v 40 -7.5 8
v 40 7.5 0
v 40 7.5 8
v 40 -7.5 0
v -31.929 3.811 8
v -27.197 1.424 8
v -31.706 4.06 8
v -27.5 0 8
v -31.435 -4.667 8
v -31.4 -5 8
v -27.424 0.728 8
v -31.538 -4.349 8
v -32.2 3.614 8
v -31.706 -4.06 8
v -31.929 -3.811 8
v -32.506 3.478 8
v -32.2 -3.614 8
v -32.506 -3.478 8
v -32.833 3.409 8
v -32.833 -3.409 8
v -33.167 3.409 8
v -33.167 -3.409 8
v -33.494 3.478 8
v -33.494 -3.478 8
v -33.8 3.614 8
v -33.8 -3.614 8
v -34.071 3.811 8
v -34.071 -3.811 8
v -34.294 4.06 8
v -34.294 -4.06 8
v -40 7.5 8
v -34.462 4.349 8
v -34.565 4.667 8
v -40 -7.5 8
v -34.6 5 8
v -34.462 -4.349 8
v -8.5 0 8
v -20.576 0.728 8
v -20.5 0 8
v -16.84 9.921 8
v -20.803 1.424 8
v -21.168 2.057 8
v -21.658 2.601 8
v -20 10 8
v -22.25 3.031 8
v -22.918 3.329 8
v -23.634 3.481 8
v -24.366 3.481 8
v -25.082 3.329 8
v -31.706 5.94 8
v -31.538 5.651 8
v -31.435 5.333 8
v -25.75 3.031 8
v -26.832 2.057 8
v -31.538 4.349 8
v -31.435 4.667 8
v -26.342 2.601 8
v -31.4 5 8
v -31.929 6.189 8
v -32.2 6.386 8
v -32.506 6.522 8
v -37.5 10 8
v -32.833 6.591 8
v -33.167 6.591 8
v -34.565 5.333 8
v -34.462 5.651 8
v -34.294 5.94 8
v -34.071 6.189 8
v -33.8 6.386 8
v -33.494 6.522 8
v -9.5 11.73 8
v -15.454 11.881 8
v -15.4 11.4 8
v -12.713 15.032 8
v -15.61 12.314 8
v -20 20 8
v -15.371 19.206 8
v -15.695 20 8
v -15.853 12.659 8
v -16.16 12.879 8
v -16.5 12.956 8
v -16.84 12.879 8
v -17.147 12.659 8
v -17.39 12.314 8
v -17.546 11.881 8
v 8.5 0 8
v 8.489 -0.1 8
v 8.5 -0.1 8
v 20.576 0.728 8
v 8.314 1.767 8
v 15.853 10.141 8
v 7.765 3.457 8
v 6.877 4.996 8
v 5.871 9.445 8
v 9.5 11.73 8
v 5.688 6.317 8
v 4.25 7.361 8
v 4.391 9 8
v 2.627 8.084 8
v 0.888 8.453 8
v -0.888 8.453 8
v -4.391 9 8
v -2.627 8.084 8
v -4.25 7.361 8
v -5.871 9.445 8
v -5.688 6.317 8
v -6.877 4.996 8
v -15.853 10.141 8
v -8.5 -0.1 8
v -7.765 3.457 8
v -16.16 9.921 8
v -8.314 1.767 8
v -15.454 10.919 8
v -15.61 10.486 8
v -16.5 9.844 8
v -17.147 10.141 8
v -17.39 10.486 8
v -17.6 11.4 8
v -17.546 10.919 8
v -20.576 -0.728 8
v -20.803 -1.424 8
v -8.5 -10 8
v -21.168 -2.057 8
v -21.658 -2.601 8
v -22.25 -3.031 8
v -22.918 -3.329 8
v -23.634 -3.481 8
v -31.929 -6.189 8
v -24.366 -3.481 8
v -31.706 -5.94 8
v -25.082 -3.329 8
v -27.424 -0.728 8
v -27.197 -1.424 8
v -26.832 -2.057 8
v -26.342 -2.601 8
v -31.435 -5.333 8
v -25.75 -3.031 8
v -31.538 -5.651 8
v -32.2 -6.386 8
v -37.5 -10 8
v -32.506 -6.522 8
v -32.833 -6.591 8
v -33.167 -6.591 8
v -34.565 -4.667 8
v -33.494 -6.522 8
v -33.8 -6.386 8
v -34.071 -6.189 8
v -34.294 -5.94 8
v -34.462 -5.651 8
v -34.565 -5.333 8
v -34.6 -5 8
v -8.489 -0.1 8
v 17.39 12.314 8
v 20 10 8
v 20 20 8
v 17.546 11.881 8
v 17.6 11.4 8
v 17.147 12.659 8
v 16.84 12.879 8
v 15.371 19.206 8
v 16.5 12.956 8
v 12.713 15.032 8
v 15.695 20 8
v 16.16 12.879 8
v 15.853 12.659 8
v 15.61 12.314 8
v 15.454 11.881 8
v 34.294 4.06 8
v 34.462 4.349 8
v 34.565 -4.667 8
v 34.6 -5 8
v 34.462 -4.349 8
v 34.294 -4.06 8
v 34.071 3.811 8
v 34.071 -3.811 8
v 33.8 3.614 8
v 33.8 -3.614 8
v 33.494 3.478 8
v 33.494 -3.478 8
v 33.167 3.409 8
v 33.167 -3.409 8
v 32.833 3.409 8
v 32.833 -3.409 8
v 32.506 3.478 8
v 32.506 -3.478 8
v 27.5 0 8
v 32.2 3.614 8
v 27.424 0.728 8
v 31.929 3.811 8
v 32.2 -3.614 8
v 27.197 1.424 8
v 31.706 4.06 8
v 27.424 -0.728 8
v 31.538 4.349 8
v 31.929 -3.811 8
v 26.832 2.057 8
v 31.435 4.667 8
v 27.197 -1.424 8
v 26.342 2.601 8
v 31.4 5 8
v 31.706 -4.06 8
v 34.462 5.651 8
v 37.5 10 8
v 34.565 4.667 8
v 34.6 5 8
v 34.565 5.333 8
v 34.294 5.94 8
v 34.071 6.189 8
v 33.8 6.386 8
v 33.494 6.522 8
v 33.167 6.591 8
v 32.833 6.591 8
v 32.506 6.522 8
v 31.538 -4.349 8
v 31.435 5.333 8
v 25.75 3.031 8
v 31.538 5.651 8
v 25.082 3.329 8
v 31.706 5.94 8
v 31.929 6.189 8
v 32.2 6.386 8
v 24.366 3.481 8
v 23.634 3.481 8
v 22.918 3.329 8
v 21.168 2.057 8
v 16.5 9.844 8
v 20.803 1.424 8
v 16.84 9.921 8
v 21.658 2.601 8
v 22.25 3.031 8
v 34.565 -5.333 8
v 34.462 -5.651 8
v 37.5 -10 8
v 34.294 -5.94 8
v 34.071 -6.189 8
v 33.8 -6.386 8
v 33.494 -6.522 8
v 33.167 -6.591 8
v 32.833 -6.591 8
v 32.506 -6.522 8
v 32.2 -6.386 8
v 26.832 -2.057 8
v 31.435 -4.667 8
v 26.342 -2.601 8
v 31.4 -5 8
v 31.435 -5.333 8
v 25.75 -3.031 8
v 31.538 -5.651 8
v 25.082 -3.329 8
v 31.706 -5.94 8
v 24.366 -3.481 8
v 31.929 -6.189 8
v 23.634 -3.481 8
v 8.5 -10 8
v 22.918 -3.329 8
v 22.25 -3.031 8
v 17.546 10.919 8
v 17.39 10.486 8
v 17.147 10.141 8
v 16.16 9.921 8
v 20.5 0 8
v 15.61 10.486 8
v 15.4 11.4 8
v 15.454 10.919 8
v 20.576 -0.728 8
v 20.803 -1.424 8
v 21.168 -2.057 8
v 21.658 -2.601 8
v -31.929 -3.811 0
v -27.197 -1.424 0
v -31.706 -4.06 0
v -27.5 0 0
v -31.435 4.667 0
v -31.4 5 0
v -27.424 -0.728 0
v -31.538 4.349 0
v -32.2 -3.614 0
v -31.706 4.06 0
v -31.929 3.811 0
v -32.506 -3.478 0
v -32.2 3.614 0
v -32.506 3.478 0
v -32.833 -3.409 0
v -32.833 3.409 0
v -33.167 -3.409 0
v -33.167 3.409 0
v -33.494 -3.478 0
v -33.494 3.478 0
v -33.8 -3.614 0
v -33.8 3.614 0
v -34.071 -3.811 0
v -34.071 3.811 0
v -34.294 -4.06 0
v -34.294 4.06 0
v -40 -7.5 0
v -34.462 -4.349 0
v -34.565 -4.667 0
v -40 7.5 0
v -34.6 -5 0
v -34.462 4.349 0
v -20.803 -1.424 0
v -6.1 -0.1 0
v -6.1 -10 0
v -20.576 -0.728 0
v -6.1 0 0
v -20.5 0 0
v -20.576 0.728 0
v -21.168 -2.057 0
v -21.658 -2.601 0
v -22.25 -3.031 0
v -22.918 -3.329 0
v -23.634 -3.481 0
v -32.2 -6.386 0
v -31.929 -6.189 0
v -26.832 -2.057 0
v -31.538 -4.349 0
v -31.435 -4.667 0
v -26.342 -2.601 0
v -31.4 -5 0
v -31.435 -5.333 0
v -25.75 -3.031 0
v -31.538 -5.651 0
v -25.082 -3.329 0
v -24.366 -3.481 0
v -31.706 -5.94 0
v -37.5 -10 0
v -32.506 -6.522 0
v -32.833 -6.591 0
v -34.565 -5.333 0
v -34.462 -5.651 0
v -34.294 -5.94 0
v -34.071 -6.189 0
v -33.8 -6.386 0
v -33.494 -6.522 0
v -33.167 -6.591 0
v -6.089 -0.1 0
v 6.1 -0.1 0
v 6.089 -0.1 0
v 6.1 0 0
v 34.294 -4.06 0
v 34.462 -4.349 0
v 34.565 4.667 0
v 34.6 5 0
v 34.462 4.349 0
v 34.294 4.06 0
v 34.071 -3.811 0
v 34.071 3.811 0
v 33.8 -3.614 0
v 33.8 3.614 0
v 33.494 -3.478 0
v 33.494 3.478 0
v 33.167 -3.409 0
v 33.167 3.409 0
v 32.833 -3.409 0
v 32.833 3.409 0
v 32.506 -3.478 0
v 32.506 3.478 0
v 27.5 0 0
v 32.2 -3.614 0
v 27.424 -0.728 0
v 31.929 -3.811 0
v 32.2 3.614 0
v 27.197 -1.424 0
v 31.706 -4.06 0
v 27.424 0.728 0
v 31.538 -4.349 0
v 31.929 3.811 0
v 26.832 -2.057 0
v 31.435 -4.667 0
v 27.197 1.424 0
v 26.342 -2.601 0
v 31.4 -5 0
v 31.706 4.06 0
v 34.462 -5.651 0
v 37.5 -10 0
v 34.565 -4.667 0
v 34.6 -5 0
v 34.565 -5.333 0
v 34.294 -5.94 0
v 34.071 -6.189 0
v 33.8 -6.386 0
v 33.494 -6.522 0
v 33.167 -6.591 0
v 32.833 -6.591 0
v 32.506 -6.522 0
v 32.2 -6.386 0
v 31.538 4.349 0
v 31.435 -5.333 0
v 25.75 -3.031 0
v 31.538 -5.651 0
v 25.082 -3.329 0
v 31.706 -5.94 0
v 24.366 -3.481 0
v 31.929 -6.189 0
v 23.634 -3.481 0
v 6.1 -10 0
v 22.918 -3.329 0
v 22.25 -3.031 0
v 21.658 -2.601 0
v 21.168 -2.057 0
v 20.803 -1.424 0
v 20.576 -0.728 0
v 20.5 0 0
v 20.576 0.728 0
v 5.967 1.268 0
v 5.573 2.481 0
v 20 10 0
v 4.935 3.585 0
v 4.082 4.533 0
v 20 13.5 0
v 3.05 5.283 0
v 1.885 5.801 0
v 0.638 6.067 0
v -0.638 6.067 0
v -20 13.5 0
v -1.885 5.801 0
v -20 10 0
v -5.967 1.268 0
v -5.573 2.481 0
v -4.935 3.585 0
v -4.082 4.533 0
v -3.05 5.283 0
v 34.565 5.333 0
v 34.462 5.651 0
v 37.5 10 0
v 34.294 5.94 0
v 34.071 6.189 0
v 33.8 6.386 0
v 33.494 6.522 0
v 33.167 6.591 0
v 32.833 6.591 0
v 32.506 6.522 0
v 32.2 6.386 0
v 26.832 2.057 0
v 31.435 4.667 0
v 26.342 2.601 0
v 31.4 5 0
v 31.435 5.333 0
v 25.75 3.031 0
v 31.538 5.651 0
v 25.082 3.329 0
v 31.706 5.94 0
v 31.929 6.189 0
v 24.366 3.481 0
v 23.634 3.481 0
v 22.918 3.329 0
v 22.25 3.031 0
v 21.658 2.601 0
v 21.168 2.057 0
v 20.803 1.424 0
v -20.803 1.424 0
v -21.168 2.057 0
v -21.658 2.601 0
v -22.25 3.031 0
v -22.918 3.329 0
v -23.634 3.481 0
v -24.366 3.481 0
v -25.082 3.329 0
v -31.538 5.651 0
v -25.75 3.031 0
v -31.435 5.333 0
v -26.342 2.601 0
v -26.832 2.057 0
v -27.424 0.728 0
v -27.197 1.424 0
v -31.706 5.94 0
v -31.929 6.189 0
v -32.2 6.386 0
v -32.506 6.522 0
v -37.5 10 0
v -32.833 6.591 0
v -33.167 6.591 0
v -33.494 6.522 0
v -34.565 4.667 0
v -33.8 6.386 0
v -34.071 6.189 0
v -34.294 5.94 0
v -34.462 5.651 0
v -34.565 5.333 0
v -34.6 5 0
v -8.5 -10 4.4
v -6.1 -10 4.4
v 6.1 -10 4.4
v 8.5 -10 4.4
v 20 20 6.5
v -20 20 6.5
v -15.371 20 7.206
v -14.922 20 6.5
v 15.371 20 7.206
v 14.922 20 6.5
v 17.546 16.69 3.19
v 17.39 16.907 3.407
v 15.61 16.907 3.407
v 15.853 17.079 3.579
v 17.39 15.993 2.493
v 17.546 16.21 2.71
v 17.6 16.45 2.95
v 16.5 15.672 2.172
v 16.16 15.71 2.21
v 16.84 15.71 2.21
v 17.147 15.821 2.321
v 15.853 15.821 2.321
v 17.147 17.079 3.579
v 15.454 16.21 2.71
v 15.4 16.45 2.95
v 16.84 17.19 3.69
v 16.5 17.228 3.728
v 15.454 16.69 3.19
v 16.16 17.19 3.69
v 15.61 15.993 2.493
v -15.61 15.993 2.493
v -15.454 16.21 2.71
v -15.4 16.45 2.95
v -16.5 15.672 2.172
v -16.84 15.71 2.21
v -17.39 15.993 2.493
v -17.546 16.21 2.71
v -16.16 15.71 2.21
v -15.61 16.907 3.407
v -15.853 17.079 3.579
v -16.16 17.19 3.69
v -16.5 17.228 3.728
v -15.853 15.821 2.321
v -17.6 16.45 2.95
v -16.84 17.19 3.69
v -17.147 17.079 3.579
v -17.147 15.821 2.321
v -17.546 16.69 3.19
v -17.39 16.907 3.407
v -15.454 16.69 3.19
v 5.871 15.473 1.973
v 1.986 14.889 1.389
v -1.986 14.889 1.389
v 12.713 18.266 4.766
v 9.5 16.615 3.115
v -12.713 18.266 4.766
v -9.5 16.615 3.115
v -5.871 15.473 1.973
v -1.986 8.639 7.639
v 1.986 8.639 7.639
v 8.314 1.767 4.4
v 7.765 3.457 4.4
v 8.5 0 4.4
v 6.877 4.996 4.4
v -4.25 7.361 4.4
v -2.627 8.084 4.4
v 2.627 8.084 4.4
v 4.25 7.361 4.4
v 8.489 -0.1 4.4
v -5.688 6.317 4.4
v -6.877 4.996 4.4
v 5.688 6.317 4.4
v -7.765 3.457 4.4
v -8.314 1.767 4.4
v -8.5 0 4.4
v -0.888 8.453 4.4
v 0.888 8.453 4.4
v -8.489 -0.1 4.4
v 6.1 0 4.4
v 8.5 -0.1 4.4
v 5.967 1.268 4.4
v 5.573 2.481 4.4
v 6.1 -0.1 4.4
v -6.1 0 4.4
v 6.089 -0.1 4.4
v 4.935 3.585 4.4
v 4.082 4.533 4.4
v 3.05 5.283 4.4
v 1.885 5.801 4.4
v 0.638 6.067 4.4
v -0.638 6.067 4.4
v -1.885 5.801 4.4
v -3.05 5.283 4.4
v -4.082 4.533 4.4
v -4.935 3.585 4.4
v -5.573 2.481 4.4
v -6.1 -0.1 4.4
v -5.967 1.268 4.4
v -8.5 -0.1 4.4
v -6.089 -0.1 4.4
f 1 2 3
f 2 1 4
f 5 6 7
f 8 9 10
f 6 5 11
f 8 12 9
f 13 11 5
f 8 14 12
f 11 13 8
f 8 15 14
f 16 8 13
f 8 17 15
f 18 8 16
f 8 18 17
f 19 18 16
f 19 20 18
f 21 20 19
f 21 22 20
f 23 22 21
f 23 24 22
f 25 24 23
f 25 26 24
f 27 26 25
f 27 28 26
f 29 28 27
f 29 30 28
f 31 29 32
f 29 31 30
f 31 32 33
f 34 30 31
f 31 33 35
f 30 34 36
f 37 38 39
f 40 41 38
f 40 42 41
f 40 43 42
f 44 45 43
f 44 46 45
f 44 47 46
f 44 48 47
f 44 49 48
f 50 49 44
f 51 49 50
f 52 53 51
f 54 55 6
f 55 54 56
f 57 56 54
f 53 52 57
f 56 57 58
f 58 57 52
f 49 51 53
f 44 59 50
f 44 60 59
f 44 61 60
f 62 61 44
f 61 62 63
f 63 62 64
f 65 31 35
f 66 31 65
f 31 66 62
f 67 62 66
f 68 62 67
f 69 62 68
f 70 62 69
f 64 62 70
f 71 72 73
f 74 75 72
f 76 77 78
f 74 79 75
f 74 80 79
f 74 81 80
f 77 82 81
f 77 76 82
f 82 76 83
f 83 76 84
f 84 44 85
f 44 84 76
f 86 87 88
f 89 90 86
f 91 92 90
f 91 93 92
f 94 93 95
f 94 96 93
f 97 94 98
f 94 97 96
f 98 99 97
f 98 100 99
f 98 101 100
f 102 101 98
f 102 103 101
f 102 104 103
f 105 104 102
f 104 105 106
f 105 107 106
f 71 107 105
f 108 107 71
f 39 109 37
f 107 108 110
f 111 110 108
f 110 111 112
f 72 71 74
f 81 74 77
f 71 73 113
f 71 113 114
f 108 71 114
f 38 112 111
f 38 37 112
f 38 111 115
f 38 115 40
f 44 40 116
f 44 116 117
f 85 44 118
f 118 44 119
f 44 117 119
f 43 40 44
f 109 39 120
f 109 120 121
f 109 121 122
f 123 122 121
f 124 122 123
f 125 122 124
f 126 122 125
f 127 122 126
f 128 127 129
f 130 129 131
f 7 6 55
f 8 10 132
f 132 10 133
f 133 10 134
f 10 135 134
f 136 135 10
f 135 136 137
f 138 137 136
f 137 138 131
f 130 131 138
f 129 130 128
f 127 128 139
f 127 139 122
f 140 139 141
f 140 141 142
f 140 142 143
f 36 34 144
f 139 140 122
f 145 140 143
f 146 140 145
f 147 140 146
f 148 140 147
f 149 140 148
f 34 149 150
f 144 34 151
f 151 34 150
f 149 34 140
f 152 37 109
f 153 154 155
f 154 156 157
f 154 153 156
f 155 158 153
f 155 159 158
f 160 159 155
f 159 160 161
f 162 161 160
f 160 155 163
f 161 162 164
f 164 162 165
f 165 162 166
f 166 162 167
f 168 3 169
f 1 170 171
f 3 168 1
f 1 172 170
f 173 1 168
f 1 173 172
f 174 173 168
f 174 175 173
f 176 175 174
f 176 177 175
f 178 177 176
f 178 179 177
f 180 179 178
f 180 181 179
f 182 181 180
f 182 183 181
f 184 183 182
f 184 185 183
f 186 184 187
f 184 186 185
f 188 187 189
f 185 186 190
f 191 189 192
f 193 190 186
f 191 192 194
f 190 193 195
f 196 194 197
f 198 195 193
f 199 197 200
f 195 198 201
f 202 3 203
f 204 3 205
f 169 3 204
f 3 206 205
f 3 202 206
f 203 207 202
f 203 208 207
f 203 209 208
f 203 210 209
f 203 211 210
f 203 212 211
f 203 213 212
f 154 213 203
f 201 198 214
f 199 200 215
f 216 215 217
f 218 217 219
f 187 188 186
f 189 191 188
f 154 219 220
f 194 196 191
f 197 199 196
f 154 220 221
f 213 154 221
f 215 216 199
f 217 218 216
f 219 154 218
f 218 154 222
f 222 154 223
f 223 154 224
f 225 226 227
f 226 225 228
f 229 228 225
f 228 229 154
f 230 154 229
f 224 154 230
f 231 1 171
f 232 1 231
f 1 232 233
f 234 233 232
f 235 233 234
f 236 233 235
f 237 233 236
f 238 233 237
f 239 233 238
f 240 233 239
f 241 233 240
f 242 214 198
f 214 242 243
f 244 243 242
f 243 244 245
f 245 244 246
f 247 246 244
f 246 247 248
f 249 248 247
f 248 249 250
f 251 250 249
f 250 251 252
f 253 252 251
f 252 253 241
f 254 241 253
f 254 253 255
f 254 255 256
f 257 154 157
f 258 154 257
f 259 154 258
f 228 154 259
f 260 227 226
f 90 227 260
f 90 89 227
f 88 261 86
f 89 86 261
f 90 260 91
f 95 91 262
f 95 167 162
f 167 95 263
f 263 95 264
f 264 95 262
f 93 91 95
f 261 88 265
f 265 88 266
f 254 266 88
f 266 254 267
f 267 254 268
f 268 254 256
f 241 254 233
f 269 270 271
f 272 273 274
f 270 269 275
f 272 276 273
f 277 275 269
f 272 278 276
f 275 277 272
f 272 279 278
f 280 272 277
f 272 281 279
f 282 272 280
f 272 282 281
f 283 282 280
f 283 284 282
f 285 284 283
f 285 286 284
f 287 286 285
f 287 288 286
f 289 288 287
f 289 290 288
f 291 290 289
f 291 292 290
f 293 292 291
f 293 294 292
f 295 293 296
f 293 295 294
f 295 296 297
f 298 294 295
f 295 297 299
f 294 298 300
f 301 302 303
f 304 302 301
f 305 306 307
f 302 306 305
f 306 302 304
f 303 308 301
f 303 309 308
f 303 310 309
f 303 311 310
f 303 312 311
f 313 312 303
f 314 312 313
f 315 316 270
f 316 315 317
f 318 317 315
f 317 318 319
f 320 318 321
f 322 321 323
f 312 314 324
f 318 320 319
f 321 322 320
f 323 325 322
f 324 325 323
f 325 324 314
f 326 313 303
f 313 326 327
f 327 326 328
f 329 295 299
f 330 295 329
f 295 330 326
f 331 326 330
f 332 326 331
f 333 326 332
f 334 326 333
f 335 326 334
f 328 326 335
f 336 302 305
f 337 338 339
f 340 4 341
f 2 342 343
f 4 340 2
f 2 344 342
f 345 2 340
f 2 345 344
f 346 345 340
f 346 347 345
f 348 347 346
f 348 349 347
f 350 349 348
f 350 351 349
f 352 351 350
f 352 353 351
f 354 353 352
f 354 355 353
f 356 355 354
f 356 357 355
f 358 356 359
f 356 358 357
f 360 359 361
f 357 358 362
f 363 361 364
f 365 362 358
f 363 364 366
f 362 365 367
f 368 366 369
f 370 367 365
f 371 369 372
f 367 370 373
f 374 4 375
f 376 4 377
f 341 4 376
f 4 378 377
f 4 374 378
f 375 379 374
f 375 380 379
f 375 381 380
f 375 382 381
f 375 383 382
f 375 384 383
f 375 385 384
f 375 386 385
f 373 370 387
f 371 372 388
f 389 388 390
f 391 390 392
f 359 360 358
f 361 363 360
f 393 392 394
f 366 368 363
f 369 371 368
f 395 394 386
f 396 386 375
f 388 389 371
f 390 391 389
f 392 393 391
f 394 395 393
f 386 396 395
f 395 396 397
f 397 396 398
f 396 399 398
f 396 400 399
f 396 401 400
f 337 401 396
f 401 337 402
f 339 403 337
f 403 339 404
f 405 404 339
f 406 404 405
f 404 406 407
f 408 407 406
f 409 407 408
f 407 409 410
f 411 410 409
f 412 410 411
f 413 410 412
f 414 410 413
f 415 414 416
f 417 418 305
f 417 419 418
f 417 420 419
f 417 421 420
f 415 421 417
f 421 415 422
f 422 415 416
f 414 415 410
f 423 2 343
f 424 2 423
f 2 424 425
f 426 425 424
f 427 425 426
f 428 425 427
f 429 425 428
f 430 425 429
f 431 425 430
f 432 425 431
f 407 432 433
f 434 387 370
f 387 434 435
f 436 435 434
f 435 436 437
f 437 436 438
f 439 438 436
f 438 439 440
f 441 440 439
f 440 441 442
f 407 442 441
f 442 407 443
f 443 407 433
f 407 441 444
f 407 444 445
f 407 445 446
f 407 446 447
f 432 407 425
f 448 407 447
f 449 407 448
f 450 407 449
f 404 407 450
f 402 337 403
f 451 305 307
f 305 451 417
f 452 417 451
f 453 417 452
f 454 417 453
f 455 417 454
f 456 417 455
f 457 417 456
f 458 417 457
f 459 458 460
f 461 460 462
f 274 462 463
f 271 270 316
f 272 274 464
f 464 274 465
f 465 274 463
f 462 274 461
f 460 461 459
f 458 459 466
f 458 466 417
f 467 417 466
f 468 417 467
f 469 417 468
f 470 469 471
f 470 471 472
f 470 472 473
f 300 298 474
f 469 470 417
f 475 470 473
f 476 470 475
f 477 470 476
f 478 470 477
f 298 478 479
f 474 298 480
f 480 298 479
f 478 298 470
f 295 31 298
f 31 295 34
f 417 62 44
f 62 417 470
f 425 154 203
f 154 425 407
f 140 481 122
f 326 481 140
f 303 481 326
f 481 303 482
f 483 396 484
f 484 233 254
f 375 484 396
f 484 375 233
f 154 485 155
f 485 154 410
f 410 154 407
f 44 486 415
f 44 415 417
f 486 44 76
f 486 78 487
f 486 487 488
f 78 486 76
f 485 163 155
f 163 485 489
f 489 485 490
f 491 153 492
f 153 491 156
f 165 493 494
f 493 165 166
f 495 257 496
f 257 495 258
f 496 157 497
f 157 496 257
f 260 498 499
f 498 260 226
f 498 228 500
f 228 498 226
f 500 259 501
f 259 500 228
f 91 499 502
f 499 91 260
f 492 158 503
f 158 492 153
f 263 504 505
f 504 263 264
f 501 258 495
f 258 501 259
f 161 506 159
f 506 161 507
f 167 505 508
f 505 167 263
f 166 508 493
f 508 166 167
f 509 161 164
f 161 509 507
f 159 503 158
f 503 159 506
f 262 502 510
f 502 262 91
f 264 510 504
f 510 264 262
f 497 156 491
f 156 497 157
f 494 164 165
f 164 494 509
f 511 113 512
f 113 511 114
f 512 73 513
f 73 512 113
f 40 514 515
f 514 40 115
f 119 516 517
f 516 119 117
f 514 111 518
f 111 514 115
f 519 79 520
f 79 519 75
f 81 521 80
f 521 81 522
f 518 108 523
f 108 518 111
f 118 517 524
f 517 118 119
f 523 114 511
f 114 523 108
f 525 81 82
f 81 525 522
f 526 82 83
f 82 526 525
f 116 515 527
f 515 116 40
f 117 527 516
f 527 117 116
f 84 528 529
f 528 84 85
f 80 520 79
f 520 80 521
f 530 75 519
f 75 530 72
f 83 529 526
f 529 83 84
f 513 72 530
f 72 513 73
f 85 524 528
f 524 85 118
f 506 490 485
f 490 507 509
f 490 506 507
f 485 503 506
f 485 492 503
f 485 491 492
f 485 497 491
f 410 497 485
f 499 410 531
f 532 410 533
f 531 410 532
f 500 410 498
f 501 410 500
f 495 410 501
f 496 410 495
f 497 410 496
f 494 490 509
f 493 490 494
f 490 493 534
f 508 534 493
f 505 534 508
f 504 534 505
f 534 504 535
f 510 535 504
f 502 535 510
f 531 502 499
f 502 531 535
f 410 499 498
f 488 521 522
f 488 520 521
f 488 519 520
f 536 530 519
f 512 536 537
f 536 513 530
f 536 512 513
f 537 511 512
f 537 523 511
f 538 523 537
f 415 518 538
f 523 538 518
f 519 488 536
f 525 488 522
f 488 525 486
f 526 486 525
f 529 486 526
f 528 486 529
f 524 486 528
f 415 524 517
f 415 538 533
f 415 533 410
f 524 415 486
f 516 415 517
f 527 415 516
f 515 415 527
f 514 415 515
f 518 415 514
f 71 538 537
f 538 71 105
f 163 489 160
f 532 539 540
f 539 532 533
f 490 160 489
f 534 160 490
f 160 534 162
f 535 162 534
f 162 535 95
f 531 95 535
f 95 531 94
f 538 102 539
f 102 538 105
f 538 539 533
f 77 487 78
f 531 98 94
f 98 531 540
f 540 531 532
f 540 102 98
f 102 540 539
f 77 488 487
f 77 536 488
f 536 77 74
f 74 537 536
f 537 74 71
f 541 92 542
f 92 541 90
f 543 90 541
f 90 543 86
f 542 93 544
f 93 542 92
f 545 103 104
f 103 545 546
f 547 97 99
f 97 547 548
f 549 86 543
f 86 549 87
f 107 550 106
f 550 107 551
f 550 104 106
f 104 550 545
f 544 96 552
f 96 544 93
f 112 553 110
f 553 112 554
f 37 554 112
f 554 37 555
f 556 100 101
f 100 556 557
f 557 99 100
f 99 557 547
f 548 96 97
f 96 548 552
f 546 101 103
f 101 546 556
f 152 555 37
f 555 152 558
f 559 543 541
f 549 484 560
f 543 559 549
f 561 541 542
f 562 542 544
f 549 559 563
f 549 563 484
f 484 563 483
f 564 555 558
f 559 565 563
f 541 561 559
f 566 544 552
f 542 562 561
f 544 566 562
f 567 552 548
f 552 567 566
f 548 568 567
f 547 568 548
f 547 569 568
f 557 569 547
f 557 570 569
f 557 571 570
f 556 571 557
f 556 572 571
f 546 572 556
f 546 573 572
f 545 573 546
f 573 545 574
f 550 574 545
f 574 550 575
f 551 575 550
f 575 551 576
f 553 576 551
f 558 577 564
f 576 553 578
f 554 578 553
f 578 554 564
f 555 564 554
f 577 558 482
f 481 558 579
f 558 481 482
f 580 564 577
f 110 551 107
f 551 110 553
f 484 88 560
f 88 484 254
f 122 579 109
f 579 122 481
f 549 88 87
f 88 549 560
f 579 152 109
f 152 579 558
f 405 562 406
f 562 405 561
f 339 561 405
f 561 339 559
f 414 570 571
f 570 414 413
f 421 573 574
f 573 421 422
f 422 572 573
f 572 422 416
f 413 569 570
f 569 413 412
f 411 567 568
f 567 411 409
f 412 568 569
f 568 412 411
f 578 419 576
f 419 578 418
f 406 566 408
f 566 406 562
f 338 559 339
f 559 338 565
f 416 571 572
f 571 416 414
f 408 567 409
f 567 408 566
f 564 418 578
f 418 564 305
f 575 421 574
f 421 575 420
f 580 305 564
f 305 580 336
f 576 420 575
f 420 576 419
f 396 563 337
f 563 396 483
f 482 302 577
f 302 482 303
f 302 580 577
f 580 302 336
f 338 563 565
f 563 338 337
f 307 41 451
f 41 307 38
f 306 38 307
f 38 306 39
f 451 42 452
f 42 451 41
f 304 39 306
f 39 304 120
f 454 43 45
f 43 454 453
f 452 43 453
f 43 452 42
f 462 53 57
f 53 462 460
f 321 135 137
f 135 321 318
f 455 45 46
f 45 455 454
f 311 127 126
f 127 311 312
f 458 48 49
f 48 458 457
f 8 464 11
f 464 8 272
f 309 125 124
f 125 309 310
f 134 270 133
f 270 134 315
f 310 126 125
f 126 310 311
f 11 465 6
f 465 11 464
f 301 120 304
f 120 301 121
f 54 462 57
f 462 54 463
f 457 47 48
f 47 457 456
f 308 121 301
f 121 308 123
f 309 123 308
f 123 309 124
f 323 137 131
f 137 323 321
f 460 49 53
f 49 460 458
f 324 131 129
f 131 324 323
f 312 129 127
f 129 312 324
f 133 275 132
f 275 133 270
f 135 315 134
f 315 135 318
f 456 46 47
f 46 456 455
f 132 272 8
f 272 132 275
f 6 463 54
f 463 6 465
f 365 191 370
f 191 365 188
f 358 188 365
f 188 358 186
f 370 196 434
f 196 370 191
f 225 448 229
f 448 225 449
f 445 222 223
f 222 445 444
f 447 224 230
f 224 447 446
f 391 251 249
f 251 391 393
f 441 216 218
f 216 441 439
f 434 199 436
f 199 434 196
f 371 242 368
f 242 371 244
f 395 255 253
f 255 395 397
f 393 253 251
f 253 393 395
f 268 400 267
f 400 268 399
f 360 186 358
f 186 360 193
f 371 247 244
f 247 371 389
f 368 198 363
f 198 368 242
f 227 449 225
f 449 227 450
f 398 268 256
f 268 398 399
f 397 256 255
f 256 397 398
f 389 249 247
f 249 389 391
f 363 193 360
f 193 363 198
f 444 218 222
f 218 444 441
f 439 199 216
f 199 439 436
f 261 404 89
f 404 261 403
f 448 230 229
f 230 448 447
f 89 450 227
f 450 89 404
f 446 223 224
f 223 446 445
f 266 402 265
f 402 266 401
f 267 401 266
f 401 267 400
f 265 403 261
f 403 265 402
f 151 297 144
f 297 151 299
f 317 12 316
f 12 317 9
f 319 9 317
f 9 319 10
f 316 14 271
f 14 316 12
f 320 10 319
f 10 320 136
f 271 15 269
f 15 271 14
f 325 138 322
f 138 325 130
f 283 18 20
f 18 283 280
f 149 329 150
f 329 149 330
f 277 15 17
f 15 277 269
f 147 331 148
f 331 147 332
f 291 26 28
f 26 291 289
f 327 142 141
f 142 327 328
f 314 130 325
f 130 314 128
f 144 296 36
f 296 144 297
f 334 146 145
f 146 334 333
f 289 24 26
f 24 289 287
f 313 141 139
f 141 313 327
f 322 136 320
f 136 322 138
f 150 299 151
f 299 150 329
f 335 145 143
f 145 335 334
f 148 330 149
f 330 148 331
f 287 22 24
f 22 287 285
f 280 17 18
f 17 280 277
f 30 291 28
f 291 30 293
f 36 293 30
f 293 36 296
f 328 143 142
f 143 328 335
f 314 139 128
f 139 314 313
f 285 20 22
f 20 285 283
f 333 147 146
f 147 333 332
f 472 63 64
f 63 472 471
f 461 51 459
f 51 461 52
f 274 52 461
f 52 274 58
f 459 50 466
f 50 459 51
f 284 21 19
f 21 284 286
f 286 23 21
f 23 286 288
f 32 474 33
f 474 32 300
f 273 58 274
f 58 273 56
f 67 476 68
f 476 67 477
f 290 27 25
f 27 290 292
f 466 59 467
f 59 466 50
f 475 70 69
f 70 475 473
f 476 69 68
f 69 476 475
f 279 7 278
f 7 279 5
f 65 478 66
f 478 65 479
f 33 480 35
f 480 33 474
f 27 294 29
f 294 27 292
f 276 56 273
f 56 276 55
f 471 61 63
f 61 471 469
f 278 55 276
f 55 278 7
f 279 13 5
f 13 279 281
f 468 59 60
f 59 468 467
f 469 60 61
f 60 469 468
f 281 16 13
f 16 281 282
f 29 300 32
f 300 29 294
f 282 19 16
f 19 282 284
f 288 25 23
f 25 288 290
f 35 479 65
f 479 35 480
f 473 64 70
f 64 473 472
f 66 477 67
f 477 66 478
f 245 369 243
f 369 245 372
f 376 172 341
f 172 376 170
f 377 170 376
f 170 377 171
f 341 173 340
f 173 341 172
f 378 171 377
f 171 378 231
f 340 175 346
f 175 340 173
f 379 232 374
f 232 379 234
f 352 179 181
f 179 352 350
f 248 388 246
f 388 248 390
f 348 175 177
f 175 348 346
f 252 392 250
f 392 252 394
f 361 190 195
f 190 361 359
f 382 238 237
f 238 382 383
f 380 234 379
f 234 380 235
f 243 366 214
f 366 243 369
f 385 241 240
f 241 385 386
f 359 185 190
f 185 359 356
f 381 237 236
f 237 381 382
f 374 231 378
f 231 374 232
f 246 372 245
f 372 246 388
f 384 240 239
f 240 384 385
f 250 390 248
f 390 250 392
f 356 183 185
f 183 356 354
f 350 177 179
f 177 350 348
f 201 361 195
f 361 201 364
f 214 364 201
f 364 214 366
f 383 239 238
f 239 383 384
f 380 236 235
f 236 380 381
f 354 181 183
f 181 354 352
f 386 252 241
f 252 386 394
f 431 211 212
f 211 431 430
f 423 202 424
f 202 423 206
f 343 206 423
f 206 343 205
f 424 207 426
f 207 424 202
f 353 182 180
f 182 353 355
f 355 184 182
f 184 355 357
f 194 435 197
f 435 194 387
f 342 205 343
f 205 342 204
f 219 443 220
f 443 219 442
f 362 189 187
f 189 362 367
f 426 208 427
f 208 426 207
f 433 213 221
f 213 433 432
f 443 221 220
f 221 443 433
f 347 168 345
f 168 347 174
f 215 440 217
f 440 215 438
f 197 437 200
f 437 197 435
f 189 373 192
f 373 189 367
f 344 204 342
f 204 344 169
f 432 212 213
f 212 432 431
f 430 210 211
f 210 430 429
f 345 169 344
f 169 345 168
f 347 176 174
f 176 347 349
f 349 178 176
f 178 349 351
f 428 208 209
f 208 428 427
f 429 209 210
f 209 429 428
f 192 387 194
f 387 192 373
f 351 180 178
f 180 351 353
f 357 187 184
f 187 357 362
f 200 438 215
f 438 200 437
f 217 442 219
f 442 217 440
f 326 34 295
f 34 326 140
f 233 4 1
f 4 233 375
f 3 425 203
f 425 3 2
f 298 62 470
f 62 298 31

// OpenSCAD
// RebeliX
//
// j-head mount + fan 40mm
// GNU GPL v3
// Martin Neruda
// http://www.reprap4u.cz

fan_width = 40;
fan_diameter = 38;
fan_mount = 33;

spring_diameter=6.5;
spring_height=5;

hotend_diameter=16.2;
hotend_height=4.8;
hotend_height_tolerance=1;

piezo_diameter=36;
piezo_height=2.2;
piezo_height_tolerance=1.4;

cylinder_diameter=piezo_diameter+5;
cylinder_height= 1+hotend_height+piezo_height-hotend_height_tolerance-piezo_height_tolerance;
cylinder_hole= 1.1;

cube_length=80;
cube_width=20;

holder_pitch=48;
holder_diameter=7;

mount_height = 8;

M3_vyska_matky=3;
M3_sirka_matky=6.7;




difference(){
	union(){
	  translate([0,0,mount_height/2])
        cube([cube_length,cube_width,mount_height],true);
	   
        translate([-fan_width/2,cube_width/2,0]) cube([fan_width,10,mount_height]); 
      
	}	

	
    
    // Vyrez pro ventilator
	translate([-fan_width/2-0.1,cube_width/2+3.5,0]) rotate([-45,0,0]) cube([fan_width+1,15,15]); 
	translate([0,cube_width/2+12,21]) rotate([-135,0,0]) cylinder(r=fan_diameter/2, h=cube_width/2);
	translate([0,cube_width/2+2,7.4]){
	 translate([fan_mount/2,0,0]) rotate([-135,0,0]) cylinder(r=1.1,h=30,$fn=20,center=true);
	 translate([-fan_mount/2,0,0]) rotate([-135,0,0]) cylinder(r=1.1,h=30,$fn=20,center=true);
	}
    
    
    
    //otvor na hotend
    translate([0,0,4.4]) cylinder(r=8.5,h=6,$fn=30);
	translate([-8.5,-cube_width/2-0.1,4.4]) cube([17,10,6]);
		
	translate([0,0,-0.1]) cylinder(r=6.1,h=10,$fn=30);
	translate([0-6.1,-cube_width/2-0.1,-0.1]) cube([12.2,10,10]);
    
       
	
	
	
	// Otvory pro prisroubovani
	translate([-holder_pitch/2,0,-0.1]) cylinder(r=holder_diameter/2,h=mount_height+1,$fn=30);
	
		
	translate([holder_pitch/2,0,-0.1]) cylinder(r=holder_diameter/2,h=mount_height+1,$fn=30);
	
	
	//otvory na šrouby
    translate([-cube_length/2+7,-5,-0.1]) cylinder(r=3.2/2,h=mount_height+1,$fn=30);
	
   
	
    
    translate([-cube_length/2+7,5,-0.1]) cylinder(r=3.2/2,h=mount_height+1,$fn=30);
	
   
    
        translate([cube_length/2-7,-5,-0.1]) cylinder(r=3.2/2,h=mount_height+1,$fn=30);
	
   
    translate([cube_length/2-7,5,-0.1]) cylinder(r=3.2/2,h=mount_height+1,$fn=30);
	
   
    
	   
      
    
    
    
	// Seriznute rohy
	translate([-cube_length/2+2.5,-cube_width/2,-0.1]) rotate([0,0,135]) cube([5,5,10]);
	translate([cube_length/2-2.5,-cube_width/2,-0.1]) rotate([0,0,-45]) cube([5,5,10]);
	translate([cube_length/2,cube_width/2-2.5,-0.1]) rotate([0,0,45]) cube([5,5,10]);
	translate([-cube_length/2+2.5,cube_width/2,-0.1]) rotate([0,0,135]) cube([5,5,10]);
}	
